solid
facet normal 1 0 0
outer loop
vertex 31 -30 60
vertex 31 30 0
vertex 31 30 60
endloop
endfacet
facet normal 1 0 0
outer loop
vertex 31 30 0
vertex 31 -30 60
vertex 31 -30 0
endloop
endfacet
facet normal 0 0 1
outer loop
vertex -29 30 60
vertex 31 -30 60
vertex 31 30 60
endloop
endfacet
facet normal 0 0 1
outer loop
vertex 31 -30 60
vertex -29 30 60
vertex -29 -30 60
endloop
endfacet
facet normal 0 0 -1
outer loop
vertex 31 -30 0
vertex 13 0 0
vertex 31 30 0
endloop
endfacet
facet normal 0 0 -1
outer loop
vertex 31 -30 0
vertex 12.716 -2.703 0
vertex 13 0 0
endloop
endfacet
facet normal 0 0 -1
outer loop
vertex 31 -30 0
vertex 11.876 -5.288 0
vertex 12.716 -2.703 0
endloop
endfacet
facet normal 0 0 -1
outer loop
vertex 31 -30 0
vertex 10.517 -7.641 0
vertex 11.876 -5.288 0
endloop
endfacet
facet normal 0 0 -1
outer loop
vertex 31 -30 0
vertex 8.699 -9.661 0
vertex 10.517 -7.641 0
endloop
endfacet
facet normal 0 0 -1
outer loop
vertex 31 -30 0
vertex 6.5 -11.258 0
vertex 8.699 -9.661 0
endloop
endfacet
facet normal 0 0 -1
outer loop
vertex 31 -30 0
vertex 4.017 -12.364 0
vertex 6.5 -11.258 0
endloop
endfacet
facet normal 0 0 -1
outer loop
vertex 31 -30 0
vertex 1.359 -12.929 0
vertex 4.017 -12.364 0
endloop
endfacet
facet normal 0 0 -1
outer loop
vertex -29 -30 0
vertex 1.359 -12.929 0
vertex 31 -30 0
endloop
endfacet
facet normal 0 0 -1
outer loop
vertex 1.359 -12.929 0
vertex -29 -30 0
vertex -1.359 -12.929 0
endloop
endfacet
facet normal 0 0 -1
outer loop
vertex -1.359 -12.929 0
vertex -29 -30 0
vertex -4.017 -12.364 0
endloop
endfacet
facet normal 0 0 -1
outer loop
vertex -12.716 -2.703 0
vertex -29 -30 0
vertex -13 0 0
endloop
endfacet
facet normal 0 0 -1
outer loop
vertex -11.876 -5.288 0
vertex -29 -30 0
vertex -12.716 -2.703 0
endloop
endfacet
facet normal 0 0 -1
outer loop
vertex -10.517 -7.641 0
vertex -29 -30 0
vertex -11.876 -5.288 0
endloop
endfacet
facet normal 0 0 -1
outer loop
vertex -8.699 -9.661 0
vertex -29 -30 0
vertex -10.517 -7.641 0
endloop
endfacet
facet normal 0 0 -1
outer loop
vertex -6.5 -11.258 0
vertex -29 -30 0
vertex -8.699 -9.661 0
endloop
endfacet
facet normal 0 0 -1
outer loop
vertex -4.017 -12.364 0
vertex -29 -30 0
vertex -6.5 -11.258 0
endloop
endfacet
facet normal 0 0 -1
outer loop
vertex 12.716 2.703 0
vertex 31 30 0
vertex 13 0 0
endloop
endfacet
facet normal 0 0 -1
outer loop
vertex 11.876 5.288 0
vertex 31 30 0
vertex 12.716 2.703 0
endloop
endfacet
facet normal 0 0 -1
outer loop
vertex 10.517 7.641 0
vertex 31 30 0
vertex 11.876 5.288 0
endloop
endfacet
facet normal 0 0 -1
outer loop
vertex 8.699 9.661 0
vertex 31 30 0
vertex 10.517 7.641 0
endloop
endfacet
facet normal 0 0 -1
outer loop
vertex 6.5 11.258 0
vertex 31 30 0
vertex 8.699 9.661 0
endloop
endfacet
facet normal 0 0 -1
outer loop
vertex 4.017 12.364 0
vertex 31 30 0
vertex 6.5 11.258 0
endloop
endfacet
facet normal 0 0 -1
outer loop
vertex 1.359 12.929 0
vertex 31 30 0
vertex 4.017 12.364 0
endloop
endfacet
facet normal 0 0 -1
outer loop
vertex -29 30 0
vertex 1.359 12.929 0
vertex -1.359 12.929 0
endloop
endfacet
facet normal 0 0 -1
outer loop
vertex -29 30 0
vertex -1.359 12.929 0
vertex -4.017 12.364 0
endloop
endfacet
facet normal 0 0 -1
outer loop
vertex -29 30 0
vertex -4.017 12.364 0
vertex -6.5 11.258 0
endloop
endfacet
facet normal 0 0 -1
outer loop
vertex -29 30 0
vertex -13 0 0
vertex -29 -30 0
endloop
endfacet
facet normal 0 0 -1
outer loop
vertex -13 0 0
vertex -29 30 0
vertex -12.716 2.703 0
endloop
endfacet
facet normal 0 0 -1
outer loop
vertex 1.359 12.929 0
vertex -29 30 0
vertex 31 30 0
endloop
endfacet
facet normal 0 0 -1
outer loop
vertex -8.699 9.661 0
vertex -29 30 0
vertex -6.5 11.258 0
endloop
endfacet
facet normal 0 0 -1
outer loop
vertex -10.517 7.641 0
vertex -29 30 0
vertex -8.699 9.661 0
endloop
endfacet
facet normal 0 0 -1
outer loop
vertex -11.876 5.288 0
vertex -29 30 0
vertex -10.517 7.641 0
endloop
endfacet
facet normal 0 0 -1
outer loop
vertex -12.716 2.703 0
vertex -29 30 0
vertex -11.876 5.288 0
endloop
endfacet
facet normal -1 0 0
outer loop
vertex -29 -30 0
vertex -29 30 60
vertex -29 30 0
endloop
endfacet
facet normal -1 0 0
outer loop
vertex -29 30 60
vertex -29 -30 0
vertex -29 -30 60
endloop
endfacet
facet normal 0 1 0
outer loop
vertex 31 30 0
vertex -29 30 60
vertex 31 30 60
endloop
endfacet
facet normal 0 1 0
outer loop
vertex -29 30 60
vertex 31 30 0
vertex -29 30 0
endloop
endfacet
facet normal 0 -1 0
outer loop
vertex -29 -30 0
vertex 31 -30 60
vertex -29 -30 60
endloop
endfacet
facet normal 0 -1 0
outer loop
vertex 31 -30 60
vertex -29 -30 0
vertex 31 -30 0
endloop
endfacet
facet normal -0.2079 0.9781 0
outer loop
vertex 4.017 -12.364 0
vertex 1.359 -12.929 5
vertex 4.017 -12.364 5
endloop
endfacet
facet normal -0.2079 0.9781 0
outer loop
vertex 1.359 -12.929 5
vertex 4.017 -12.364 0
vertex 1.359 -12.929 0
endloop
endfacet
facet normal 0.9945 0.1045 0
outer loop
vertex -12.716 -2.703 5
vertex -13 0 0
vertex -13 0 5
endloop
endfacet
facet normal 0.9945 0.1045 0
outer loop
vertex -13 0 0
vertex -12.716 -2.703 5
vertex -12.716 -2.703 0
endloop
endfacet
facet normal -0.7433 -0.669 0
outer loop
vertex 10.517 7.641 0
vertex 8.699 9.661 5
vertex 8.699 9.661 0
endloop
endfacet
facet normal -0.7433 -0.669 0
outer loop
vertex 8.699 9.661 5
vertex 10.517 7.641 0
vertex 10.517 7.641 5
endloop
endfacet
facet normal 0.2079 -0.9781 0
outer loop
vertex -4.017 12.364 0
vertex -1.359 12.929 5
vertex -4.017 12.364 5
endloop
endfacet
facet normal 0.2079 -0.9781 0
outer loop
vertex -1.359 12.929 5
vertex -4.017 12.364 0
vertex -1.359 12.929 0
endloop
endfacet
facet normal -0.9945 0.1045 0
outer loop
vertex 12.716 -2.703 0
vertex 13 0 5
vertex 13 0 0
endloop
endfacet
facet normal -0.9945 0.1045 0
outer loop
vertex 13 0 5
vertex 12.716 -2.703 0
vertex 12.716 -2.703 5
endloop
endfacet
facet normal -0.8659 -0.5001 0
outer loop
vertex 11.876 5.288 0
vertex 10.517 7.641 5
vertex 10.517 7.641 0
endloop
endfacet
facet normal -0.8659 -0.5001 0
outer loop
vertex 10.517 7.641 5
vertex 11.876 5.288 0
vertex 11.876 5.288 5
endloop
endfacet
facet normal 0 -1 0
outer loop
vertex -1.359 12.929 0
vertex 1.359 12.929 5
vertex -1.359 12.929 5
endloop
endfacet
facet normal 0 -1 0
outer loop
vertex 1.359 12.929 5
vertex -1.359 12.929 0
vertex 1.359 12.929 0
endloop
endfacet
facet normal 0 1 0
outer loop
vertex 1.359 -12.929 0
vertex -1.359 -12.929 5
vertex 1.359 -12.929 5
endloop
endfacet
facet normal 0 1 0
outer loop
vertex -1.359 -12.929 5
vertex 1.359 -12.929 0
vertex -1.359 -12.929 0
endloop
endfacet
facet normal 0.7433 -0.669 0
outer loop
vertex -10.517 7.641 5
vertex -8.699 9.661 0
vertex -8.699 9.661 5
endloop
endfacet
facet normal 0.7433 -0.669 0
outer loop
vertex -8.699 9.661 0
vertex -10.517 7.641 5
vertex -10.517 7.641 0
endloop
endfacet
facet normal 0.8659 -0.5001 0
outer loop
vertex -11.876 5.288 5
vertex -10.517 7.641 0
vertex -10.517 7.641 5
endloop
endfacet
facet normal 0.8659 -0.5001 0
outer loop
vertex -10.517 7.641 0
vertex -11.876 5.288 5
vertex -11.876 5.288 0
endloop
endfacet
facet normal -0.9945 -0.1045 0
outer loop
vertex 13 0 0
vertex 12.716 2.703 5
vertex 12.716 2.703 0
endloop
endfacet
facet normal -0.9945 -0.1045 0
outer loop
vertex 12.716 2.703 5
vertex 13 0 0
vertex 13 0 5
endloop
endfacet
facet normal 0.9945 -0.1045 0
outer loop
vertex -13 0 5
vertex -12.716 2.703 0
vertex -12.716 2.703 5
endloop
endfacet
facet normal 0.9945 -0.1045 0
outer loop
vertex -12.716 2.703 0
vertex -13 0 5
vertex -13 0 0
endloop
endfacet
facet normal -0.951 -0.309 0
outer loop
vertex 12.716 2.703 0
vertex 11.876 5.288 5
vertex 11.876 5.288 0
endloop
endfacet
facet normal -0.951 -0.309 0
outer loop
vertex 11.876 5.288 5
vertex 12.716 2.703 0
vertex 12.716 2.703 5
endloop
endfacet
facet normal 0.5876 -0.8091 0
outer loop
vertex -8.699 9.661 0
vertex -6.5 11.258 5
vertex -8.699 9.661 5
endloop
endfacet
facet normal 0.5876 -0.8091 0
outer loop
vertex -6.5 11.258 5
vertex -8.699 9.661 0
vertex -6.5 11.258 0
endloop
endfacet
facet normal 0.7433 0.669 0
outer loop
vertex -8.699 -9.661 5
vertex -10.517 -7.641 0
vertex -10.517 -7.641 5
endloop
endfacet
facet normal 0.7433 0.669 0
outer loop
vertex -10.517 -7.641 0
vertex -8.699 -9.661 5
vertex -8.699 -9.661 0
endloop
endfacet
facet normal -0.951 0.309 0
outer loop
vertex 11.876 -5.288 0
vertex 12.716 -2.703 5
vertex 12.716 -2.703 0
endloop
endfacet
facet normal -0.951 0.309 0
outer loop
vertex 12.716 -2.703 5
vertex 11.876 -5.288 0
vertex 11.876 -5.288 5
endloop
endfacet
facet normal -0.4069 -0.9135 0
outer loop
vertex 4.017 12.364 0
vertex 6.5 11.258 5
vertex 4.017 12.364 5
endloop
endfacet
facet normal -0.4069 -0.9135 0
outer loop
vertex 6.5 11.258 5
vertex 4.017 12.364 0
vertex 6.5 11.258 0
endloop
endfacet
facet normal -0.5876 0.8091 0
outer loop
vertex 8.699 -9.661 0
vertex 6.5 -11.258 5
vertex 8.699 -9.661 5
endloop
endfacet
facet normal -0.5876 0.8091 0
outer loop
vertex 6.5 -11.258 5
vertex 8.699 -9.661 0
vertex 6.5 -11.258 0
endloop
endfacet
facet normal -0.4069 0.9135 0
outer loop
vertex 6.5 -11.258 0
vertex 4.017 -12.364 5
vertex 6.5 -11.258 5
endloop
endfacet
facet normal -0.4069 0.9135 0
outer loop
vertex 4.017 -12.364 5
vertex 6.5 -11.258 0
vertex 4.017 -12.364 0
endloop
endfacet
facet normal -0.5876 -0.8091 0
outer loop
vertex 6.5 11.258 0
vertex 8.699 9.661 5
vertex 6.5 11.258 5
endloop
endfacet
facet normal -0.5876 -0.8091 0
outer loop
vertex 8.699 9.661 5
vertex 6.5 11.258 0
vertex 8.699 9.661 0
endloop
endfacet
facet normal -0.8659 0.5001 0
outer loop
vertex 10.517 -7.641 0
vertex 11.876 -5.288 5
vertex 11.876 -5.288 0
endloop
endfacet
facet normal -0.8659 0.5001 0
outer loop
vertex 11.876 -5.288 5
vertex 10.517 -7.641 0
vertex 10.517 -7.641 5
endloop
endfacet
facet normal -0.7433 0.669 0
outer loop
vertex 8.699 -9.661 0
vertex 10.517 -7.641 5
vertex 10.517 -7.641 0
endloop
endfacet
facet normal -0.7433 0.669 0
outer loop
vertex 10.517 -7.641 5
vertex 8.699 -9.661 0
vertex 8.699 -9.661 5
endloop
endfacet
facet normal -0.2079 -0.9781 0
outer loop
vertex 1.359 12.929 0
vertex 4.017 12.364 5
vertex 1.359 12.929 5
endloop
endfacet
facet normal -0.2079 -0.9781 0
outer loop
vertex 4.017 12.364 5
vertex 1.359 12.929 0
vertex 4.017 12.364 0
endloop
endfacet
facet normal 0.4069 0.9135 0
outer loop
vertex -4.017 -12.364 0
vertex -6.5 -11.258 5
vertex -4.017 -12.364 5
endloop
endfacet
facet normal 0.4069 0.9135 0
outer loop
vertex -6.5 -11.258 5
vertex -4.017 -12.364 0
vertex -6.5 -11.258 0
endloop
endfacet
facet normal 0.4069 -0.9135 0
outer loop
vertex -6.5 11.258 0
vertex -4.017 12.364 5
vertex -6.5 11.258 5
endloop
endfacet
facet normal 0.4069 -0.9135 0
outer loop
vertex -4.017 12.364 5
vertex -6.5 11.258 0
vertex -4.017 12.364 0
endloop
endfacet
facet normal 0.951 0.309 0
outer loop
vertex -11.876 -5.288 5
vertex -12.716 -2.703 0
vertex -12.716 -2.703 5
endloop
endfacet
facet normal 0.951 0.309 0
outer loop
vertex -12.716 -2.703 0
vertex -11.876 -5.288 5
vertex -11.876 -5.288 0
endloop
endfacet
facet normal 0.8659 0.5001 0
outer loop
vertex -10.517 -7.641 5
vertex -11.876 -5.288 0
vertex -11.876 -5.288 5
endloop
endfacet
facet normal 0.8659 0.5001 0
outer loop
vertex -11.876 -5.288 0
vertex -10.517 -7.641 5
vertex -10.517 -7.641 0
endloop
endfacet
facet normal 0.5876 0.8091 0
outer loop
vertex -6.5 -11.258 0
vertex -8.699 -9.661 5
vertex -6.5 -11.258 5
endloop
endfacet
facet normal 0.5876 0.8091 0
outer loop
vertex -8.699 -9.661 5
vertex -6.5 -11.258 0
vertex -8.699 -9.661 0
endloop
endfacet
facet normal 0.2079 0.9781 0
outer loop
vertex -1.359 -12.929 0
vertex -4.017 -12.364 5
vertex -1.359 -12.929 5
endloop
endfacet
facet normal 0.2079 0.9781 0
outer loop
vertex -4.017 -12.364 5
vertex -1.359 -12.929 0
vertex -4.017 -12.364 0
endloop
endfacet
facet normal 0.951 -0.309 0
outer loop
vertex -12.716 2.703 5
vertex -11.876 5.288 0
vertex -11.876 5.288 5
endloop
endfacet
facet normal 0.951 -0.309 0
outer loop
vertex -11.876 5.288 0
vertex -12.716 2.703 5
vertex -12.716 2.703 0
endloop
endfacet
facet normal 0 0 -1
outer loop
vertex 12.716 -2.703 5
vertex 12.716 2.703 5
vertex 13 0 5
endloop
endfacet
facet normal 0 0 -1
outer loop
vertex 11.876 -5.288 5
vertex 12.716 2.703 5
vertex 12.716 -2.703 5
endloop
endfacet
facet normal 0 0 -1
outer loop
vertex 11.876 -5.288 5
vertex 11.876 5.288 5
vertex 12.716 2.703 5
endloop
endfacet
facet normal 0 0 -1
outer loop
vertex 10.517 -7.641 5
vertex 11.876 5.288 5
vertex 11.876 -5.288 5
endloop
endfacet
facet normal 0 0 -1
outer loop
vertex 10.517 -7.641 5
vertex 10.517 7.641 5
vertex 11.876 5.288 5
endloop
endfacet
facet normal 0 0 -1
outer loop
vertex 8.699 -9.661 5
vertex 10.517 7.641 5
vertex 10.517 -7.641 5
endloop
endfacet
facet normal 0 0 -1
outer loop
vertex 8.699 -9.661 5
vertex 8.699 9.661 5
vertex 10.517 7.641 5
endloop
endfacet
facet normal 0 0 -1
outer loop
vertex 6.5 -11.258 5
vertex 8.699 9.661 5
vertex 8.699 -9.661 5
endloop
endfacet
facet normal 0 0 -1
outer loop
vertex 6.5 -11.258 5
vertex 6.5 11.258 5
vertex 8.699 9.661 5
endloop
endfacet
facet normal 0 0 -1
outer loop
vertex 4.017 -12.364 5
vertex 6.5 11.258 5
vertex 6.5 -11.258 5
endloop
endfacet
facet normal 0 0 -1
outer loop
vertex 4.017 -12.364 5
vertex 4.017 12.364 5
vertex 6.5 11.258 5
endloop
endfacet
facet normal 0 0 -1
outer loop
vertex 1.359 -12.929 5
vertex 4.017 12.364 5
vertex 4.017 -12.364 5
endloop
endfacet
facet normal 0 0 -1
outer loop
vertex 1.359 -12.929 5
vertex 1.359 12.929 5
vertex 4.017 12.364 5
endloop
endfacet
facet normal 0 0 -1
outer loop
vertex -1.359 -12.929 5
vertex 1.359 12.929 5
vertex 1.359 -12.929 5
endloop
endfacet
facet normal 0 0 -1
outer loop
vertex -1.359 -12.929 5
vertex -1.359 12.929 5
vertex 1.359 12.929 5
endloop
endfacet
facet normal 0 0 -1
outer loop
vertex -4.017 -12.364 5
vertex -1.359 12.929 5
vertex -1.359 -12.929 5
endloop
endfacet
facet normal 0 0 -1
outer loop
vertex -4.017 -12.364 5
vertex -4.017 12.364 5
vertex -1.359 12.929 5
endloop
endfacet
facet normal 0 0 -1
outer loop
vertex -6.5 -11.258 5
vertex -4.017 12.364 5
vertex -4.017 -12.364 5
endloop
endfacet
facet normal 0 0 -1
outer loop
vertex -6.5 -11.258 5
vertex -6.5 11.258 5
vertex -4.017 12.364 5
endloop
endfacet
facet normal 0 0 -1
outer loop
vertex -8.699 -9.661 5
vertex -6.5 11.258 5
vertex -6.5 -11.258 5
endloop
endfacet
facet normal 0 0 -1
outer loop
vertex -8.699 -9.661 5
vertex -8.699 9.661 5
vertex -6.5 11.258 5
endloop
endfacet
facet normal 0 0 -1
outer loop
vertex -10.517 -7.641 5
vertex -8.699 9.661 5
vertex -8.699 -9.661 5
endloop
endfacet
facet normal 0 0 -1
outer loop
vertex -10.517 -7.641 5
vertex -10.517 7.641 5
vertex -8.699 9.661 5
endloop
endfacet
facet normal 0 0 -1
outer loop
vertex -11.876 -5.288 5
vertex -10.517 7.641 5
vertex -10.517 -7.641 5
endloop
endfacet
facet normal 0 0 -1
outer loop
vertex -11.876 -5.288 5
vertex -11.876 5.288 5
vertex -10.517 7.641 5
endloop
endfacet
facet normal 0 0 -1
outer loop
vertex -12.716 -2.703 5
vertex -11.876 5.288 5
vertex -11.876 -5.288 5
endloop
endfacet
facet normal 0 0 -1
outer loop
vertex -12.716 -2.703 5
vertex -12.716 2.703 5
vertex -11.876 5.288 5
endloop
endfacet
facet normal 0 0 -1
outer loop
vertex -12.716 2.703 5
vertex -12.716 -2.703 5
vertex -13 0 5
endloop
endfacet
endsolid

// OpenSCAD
//Test to see how to use OO style code.

//I create the code once to create a bearing given any number of parameters
//This could be complex
module Bearing(diameter)
	{
	cylinder(5,diameter,diameter);
	}

//I create my specific bearing I want to use without repeating code in 'Parent' Bearing()
//I probably want to use multiple different sized bearings 
module bearing_I_Want_to_Use()
	{
	Bearing(13);
	}


//I want to model something that uses this bearing and access that bearings
//diameter maybe to do some translation. eg replace 1 with bearing_I_Want_to_Use diameter

difference()
	{
	translate([1,0,30])cube(60,true);
	bearing_I_Want_to_Use();
	}
